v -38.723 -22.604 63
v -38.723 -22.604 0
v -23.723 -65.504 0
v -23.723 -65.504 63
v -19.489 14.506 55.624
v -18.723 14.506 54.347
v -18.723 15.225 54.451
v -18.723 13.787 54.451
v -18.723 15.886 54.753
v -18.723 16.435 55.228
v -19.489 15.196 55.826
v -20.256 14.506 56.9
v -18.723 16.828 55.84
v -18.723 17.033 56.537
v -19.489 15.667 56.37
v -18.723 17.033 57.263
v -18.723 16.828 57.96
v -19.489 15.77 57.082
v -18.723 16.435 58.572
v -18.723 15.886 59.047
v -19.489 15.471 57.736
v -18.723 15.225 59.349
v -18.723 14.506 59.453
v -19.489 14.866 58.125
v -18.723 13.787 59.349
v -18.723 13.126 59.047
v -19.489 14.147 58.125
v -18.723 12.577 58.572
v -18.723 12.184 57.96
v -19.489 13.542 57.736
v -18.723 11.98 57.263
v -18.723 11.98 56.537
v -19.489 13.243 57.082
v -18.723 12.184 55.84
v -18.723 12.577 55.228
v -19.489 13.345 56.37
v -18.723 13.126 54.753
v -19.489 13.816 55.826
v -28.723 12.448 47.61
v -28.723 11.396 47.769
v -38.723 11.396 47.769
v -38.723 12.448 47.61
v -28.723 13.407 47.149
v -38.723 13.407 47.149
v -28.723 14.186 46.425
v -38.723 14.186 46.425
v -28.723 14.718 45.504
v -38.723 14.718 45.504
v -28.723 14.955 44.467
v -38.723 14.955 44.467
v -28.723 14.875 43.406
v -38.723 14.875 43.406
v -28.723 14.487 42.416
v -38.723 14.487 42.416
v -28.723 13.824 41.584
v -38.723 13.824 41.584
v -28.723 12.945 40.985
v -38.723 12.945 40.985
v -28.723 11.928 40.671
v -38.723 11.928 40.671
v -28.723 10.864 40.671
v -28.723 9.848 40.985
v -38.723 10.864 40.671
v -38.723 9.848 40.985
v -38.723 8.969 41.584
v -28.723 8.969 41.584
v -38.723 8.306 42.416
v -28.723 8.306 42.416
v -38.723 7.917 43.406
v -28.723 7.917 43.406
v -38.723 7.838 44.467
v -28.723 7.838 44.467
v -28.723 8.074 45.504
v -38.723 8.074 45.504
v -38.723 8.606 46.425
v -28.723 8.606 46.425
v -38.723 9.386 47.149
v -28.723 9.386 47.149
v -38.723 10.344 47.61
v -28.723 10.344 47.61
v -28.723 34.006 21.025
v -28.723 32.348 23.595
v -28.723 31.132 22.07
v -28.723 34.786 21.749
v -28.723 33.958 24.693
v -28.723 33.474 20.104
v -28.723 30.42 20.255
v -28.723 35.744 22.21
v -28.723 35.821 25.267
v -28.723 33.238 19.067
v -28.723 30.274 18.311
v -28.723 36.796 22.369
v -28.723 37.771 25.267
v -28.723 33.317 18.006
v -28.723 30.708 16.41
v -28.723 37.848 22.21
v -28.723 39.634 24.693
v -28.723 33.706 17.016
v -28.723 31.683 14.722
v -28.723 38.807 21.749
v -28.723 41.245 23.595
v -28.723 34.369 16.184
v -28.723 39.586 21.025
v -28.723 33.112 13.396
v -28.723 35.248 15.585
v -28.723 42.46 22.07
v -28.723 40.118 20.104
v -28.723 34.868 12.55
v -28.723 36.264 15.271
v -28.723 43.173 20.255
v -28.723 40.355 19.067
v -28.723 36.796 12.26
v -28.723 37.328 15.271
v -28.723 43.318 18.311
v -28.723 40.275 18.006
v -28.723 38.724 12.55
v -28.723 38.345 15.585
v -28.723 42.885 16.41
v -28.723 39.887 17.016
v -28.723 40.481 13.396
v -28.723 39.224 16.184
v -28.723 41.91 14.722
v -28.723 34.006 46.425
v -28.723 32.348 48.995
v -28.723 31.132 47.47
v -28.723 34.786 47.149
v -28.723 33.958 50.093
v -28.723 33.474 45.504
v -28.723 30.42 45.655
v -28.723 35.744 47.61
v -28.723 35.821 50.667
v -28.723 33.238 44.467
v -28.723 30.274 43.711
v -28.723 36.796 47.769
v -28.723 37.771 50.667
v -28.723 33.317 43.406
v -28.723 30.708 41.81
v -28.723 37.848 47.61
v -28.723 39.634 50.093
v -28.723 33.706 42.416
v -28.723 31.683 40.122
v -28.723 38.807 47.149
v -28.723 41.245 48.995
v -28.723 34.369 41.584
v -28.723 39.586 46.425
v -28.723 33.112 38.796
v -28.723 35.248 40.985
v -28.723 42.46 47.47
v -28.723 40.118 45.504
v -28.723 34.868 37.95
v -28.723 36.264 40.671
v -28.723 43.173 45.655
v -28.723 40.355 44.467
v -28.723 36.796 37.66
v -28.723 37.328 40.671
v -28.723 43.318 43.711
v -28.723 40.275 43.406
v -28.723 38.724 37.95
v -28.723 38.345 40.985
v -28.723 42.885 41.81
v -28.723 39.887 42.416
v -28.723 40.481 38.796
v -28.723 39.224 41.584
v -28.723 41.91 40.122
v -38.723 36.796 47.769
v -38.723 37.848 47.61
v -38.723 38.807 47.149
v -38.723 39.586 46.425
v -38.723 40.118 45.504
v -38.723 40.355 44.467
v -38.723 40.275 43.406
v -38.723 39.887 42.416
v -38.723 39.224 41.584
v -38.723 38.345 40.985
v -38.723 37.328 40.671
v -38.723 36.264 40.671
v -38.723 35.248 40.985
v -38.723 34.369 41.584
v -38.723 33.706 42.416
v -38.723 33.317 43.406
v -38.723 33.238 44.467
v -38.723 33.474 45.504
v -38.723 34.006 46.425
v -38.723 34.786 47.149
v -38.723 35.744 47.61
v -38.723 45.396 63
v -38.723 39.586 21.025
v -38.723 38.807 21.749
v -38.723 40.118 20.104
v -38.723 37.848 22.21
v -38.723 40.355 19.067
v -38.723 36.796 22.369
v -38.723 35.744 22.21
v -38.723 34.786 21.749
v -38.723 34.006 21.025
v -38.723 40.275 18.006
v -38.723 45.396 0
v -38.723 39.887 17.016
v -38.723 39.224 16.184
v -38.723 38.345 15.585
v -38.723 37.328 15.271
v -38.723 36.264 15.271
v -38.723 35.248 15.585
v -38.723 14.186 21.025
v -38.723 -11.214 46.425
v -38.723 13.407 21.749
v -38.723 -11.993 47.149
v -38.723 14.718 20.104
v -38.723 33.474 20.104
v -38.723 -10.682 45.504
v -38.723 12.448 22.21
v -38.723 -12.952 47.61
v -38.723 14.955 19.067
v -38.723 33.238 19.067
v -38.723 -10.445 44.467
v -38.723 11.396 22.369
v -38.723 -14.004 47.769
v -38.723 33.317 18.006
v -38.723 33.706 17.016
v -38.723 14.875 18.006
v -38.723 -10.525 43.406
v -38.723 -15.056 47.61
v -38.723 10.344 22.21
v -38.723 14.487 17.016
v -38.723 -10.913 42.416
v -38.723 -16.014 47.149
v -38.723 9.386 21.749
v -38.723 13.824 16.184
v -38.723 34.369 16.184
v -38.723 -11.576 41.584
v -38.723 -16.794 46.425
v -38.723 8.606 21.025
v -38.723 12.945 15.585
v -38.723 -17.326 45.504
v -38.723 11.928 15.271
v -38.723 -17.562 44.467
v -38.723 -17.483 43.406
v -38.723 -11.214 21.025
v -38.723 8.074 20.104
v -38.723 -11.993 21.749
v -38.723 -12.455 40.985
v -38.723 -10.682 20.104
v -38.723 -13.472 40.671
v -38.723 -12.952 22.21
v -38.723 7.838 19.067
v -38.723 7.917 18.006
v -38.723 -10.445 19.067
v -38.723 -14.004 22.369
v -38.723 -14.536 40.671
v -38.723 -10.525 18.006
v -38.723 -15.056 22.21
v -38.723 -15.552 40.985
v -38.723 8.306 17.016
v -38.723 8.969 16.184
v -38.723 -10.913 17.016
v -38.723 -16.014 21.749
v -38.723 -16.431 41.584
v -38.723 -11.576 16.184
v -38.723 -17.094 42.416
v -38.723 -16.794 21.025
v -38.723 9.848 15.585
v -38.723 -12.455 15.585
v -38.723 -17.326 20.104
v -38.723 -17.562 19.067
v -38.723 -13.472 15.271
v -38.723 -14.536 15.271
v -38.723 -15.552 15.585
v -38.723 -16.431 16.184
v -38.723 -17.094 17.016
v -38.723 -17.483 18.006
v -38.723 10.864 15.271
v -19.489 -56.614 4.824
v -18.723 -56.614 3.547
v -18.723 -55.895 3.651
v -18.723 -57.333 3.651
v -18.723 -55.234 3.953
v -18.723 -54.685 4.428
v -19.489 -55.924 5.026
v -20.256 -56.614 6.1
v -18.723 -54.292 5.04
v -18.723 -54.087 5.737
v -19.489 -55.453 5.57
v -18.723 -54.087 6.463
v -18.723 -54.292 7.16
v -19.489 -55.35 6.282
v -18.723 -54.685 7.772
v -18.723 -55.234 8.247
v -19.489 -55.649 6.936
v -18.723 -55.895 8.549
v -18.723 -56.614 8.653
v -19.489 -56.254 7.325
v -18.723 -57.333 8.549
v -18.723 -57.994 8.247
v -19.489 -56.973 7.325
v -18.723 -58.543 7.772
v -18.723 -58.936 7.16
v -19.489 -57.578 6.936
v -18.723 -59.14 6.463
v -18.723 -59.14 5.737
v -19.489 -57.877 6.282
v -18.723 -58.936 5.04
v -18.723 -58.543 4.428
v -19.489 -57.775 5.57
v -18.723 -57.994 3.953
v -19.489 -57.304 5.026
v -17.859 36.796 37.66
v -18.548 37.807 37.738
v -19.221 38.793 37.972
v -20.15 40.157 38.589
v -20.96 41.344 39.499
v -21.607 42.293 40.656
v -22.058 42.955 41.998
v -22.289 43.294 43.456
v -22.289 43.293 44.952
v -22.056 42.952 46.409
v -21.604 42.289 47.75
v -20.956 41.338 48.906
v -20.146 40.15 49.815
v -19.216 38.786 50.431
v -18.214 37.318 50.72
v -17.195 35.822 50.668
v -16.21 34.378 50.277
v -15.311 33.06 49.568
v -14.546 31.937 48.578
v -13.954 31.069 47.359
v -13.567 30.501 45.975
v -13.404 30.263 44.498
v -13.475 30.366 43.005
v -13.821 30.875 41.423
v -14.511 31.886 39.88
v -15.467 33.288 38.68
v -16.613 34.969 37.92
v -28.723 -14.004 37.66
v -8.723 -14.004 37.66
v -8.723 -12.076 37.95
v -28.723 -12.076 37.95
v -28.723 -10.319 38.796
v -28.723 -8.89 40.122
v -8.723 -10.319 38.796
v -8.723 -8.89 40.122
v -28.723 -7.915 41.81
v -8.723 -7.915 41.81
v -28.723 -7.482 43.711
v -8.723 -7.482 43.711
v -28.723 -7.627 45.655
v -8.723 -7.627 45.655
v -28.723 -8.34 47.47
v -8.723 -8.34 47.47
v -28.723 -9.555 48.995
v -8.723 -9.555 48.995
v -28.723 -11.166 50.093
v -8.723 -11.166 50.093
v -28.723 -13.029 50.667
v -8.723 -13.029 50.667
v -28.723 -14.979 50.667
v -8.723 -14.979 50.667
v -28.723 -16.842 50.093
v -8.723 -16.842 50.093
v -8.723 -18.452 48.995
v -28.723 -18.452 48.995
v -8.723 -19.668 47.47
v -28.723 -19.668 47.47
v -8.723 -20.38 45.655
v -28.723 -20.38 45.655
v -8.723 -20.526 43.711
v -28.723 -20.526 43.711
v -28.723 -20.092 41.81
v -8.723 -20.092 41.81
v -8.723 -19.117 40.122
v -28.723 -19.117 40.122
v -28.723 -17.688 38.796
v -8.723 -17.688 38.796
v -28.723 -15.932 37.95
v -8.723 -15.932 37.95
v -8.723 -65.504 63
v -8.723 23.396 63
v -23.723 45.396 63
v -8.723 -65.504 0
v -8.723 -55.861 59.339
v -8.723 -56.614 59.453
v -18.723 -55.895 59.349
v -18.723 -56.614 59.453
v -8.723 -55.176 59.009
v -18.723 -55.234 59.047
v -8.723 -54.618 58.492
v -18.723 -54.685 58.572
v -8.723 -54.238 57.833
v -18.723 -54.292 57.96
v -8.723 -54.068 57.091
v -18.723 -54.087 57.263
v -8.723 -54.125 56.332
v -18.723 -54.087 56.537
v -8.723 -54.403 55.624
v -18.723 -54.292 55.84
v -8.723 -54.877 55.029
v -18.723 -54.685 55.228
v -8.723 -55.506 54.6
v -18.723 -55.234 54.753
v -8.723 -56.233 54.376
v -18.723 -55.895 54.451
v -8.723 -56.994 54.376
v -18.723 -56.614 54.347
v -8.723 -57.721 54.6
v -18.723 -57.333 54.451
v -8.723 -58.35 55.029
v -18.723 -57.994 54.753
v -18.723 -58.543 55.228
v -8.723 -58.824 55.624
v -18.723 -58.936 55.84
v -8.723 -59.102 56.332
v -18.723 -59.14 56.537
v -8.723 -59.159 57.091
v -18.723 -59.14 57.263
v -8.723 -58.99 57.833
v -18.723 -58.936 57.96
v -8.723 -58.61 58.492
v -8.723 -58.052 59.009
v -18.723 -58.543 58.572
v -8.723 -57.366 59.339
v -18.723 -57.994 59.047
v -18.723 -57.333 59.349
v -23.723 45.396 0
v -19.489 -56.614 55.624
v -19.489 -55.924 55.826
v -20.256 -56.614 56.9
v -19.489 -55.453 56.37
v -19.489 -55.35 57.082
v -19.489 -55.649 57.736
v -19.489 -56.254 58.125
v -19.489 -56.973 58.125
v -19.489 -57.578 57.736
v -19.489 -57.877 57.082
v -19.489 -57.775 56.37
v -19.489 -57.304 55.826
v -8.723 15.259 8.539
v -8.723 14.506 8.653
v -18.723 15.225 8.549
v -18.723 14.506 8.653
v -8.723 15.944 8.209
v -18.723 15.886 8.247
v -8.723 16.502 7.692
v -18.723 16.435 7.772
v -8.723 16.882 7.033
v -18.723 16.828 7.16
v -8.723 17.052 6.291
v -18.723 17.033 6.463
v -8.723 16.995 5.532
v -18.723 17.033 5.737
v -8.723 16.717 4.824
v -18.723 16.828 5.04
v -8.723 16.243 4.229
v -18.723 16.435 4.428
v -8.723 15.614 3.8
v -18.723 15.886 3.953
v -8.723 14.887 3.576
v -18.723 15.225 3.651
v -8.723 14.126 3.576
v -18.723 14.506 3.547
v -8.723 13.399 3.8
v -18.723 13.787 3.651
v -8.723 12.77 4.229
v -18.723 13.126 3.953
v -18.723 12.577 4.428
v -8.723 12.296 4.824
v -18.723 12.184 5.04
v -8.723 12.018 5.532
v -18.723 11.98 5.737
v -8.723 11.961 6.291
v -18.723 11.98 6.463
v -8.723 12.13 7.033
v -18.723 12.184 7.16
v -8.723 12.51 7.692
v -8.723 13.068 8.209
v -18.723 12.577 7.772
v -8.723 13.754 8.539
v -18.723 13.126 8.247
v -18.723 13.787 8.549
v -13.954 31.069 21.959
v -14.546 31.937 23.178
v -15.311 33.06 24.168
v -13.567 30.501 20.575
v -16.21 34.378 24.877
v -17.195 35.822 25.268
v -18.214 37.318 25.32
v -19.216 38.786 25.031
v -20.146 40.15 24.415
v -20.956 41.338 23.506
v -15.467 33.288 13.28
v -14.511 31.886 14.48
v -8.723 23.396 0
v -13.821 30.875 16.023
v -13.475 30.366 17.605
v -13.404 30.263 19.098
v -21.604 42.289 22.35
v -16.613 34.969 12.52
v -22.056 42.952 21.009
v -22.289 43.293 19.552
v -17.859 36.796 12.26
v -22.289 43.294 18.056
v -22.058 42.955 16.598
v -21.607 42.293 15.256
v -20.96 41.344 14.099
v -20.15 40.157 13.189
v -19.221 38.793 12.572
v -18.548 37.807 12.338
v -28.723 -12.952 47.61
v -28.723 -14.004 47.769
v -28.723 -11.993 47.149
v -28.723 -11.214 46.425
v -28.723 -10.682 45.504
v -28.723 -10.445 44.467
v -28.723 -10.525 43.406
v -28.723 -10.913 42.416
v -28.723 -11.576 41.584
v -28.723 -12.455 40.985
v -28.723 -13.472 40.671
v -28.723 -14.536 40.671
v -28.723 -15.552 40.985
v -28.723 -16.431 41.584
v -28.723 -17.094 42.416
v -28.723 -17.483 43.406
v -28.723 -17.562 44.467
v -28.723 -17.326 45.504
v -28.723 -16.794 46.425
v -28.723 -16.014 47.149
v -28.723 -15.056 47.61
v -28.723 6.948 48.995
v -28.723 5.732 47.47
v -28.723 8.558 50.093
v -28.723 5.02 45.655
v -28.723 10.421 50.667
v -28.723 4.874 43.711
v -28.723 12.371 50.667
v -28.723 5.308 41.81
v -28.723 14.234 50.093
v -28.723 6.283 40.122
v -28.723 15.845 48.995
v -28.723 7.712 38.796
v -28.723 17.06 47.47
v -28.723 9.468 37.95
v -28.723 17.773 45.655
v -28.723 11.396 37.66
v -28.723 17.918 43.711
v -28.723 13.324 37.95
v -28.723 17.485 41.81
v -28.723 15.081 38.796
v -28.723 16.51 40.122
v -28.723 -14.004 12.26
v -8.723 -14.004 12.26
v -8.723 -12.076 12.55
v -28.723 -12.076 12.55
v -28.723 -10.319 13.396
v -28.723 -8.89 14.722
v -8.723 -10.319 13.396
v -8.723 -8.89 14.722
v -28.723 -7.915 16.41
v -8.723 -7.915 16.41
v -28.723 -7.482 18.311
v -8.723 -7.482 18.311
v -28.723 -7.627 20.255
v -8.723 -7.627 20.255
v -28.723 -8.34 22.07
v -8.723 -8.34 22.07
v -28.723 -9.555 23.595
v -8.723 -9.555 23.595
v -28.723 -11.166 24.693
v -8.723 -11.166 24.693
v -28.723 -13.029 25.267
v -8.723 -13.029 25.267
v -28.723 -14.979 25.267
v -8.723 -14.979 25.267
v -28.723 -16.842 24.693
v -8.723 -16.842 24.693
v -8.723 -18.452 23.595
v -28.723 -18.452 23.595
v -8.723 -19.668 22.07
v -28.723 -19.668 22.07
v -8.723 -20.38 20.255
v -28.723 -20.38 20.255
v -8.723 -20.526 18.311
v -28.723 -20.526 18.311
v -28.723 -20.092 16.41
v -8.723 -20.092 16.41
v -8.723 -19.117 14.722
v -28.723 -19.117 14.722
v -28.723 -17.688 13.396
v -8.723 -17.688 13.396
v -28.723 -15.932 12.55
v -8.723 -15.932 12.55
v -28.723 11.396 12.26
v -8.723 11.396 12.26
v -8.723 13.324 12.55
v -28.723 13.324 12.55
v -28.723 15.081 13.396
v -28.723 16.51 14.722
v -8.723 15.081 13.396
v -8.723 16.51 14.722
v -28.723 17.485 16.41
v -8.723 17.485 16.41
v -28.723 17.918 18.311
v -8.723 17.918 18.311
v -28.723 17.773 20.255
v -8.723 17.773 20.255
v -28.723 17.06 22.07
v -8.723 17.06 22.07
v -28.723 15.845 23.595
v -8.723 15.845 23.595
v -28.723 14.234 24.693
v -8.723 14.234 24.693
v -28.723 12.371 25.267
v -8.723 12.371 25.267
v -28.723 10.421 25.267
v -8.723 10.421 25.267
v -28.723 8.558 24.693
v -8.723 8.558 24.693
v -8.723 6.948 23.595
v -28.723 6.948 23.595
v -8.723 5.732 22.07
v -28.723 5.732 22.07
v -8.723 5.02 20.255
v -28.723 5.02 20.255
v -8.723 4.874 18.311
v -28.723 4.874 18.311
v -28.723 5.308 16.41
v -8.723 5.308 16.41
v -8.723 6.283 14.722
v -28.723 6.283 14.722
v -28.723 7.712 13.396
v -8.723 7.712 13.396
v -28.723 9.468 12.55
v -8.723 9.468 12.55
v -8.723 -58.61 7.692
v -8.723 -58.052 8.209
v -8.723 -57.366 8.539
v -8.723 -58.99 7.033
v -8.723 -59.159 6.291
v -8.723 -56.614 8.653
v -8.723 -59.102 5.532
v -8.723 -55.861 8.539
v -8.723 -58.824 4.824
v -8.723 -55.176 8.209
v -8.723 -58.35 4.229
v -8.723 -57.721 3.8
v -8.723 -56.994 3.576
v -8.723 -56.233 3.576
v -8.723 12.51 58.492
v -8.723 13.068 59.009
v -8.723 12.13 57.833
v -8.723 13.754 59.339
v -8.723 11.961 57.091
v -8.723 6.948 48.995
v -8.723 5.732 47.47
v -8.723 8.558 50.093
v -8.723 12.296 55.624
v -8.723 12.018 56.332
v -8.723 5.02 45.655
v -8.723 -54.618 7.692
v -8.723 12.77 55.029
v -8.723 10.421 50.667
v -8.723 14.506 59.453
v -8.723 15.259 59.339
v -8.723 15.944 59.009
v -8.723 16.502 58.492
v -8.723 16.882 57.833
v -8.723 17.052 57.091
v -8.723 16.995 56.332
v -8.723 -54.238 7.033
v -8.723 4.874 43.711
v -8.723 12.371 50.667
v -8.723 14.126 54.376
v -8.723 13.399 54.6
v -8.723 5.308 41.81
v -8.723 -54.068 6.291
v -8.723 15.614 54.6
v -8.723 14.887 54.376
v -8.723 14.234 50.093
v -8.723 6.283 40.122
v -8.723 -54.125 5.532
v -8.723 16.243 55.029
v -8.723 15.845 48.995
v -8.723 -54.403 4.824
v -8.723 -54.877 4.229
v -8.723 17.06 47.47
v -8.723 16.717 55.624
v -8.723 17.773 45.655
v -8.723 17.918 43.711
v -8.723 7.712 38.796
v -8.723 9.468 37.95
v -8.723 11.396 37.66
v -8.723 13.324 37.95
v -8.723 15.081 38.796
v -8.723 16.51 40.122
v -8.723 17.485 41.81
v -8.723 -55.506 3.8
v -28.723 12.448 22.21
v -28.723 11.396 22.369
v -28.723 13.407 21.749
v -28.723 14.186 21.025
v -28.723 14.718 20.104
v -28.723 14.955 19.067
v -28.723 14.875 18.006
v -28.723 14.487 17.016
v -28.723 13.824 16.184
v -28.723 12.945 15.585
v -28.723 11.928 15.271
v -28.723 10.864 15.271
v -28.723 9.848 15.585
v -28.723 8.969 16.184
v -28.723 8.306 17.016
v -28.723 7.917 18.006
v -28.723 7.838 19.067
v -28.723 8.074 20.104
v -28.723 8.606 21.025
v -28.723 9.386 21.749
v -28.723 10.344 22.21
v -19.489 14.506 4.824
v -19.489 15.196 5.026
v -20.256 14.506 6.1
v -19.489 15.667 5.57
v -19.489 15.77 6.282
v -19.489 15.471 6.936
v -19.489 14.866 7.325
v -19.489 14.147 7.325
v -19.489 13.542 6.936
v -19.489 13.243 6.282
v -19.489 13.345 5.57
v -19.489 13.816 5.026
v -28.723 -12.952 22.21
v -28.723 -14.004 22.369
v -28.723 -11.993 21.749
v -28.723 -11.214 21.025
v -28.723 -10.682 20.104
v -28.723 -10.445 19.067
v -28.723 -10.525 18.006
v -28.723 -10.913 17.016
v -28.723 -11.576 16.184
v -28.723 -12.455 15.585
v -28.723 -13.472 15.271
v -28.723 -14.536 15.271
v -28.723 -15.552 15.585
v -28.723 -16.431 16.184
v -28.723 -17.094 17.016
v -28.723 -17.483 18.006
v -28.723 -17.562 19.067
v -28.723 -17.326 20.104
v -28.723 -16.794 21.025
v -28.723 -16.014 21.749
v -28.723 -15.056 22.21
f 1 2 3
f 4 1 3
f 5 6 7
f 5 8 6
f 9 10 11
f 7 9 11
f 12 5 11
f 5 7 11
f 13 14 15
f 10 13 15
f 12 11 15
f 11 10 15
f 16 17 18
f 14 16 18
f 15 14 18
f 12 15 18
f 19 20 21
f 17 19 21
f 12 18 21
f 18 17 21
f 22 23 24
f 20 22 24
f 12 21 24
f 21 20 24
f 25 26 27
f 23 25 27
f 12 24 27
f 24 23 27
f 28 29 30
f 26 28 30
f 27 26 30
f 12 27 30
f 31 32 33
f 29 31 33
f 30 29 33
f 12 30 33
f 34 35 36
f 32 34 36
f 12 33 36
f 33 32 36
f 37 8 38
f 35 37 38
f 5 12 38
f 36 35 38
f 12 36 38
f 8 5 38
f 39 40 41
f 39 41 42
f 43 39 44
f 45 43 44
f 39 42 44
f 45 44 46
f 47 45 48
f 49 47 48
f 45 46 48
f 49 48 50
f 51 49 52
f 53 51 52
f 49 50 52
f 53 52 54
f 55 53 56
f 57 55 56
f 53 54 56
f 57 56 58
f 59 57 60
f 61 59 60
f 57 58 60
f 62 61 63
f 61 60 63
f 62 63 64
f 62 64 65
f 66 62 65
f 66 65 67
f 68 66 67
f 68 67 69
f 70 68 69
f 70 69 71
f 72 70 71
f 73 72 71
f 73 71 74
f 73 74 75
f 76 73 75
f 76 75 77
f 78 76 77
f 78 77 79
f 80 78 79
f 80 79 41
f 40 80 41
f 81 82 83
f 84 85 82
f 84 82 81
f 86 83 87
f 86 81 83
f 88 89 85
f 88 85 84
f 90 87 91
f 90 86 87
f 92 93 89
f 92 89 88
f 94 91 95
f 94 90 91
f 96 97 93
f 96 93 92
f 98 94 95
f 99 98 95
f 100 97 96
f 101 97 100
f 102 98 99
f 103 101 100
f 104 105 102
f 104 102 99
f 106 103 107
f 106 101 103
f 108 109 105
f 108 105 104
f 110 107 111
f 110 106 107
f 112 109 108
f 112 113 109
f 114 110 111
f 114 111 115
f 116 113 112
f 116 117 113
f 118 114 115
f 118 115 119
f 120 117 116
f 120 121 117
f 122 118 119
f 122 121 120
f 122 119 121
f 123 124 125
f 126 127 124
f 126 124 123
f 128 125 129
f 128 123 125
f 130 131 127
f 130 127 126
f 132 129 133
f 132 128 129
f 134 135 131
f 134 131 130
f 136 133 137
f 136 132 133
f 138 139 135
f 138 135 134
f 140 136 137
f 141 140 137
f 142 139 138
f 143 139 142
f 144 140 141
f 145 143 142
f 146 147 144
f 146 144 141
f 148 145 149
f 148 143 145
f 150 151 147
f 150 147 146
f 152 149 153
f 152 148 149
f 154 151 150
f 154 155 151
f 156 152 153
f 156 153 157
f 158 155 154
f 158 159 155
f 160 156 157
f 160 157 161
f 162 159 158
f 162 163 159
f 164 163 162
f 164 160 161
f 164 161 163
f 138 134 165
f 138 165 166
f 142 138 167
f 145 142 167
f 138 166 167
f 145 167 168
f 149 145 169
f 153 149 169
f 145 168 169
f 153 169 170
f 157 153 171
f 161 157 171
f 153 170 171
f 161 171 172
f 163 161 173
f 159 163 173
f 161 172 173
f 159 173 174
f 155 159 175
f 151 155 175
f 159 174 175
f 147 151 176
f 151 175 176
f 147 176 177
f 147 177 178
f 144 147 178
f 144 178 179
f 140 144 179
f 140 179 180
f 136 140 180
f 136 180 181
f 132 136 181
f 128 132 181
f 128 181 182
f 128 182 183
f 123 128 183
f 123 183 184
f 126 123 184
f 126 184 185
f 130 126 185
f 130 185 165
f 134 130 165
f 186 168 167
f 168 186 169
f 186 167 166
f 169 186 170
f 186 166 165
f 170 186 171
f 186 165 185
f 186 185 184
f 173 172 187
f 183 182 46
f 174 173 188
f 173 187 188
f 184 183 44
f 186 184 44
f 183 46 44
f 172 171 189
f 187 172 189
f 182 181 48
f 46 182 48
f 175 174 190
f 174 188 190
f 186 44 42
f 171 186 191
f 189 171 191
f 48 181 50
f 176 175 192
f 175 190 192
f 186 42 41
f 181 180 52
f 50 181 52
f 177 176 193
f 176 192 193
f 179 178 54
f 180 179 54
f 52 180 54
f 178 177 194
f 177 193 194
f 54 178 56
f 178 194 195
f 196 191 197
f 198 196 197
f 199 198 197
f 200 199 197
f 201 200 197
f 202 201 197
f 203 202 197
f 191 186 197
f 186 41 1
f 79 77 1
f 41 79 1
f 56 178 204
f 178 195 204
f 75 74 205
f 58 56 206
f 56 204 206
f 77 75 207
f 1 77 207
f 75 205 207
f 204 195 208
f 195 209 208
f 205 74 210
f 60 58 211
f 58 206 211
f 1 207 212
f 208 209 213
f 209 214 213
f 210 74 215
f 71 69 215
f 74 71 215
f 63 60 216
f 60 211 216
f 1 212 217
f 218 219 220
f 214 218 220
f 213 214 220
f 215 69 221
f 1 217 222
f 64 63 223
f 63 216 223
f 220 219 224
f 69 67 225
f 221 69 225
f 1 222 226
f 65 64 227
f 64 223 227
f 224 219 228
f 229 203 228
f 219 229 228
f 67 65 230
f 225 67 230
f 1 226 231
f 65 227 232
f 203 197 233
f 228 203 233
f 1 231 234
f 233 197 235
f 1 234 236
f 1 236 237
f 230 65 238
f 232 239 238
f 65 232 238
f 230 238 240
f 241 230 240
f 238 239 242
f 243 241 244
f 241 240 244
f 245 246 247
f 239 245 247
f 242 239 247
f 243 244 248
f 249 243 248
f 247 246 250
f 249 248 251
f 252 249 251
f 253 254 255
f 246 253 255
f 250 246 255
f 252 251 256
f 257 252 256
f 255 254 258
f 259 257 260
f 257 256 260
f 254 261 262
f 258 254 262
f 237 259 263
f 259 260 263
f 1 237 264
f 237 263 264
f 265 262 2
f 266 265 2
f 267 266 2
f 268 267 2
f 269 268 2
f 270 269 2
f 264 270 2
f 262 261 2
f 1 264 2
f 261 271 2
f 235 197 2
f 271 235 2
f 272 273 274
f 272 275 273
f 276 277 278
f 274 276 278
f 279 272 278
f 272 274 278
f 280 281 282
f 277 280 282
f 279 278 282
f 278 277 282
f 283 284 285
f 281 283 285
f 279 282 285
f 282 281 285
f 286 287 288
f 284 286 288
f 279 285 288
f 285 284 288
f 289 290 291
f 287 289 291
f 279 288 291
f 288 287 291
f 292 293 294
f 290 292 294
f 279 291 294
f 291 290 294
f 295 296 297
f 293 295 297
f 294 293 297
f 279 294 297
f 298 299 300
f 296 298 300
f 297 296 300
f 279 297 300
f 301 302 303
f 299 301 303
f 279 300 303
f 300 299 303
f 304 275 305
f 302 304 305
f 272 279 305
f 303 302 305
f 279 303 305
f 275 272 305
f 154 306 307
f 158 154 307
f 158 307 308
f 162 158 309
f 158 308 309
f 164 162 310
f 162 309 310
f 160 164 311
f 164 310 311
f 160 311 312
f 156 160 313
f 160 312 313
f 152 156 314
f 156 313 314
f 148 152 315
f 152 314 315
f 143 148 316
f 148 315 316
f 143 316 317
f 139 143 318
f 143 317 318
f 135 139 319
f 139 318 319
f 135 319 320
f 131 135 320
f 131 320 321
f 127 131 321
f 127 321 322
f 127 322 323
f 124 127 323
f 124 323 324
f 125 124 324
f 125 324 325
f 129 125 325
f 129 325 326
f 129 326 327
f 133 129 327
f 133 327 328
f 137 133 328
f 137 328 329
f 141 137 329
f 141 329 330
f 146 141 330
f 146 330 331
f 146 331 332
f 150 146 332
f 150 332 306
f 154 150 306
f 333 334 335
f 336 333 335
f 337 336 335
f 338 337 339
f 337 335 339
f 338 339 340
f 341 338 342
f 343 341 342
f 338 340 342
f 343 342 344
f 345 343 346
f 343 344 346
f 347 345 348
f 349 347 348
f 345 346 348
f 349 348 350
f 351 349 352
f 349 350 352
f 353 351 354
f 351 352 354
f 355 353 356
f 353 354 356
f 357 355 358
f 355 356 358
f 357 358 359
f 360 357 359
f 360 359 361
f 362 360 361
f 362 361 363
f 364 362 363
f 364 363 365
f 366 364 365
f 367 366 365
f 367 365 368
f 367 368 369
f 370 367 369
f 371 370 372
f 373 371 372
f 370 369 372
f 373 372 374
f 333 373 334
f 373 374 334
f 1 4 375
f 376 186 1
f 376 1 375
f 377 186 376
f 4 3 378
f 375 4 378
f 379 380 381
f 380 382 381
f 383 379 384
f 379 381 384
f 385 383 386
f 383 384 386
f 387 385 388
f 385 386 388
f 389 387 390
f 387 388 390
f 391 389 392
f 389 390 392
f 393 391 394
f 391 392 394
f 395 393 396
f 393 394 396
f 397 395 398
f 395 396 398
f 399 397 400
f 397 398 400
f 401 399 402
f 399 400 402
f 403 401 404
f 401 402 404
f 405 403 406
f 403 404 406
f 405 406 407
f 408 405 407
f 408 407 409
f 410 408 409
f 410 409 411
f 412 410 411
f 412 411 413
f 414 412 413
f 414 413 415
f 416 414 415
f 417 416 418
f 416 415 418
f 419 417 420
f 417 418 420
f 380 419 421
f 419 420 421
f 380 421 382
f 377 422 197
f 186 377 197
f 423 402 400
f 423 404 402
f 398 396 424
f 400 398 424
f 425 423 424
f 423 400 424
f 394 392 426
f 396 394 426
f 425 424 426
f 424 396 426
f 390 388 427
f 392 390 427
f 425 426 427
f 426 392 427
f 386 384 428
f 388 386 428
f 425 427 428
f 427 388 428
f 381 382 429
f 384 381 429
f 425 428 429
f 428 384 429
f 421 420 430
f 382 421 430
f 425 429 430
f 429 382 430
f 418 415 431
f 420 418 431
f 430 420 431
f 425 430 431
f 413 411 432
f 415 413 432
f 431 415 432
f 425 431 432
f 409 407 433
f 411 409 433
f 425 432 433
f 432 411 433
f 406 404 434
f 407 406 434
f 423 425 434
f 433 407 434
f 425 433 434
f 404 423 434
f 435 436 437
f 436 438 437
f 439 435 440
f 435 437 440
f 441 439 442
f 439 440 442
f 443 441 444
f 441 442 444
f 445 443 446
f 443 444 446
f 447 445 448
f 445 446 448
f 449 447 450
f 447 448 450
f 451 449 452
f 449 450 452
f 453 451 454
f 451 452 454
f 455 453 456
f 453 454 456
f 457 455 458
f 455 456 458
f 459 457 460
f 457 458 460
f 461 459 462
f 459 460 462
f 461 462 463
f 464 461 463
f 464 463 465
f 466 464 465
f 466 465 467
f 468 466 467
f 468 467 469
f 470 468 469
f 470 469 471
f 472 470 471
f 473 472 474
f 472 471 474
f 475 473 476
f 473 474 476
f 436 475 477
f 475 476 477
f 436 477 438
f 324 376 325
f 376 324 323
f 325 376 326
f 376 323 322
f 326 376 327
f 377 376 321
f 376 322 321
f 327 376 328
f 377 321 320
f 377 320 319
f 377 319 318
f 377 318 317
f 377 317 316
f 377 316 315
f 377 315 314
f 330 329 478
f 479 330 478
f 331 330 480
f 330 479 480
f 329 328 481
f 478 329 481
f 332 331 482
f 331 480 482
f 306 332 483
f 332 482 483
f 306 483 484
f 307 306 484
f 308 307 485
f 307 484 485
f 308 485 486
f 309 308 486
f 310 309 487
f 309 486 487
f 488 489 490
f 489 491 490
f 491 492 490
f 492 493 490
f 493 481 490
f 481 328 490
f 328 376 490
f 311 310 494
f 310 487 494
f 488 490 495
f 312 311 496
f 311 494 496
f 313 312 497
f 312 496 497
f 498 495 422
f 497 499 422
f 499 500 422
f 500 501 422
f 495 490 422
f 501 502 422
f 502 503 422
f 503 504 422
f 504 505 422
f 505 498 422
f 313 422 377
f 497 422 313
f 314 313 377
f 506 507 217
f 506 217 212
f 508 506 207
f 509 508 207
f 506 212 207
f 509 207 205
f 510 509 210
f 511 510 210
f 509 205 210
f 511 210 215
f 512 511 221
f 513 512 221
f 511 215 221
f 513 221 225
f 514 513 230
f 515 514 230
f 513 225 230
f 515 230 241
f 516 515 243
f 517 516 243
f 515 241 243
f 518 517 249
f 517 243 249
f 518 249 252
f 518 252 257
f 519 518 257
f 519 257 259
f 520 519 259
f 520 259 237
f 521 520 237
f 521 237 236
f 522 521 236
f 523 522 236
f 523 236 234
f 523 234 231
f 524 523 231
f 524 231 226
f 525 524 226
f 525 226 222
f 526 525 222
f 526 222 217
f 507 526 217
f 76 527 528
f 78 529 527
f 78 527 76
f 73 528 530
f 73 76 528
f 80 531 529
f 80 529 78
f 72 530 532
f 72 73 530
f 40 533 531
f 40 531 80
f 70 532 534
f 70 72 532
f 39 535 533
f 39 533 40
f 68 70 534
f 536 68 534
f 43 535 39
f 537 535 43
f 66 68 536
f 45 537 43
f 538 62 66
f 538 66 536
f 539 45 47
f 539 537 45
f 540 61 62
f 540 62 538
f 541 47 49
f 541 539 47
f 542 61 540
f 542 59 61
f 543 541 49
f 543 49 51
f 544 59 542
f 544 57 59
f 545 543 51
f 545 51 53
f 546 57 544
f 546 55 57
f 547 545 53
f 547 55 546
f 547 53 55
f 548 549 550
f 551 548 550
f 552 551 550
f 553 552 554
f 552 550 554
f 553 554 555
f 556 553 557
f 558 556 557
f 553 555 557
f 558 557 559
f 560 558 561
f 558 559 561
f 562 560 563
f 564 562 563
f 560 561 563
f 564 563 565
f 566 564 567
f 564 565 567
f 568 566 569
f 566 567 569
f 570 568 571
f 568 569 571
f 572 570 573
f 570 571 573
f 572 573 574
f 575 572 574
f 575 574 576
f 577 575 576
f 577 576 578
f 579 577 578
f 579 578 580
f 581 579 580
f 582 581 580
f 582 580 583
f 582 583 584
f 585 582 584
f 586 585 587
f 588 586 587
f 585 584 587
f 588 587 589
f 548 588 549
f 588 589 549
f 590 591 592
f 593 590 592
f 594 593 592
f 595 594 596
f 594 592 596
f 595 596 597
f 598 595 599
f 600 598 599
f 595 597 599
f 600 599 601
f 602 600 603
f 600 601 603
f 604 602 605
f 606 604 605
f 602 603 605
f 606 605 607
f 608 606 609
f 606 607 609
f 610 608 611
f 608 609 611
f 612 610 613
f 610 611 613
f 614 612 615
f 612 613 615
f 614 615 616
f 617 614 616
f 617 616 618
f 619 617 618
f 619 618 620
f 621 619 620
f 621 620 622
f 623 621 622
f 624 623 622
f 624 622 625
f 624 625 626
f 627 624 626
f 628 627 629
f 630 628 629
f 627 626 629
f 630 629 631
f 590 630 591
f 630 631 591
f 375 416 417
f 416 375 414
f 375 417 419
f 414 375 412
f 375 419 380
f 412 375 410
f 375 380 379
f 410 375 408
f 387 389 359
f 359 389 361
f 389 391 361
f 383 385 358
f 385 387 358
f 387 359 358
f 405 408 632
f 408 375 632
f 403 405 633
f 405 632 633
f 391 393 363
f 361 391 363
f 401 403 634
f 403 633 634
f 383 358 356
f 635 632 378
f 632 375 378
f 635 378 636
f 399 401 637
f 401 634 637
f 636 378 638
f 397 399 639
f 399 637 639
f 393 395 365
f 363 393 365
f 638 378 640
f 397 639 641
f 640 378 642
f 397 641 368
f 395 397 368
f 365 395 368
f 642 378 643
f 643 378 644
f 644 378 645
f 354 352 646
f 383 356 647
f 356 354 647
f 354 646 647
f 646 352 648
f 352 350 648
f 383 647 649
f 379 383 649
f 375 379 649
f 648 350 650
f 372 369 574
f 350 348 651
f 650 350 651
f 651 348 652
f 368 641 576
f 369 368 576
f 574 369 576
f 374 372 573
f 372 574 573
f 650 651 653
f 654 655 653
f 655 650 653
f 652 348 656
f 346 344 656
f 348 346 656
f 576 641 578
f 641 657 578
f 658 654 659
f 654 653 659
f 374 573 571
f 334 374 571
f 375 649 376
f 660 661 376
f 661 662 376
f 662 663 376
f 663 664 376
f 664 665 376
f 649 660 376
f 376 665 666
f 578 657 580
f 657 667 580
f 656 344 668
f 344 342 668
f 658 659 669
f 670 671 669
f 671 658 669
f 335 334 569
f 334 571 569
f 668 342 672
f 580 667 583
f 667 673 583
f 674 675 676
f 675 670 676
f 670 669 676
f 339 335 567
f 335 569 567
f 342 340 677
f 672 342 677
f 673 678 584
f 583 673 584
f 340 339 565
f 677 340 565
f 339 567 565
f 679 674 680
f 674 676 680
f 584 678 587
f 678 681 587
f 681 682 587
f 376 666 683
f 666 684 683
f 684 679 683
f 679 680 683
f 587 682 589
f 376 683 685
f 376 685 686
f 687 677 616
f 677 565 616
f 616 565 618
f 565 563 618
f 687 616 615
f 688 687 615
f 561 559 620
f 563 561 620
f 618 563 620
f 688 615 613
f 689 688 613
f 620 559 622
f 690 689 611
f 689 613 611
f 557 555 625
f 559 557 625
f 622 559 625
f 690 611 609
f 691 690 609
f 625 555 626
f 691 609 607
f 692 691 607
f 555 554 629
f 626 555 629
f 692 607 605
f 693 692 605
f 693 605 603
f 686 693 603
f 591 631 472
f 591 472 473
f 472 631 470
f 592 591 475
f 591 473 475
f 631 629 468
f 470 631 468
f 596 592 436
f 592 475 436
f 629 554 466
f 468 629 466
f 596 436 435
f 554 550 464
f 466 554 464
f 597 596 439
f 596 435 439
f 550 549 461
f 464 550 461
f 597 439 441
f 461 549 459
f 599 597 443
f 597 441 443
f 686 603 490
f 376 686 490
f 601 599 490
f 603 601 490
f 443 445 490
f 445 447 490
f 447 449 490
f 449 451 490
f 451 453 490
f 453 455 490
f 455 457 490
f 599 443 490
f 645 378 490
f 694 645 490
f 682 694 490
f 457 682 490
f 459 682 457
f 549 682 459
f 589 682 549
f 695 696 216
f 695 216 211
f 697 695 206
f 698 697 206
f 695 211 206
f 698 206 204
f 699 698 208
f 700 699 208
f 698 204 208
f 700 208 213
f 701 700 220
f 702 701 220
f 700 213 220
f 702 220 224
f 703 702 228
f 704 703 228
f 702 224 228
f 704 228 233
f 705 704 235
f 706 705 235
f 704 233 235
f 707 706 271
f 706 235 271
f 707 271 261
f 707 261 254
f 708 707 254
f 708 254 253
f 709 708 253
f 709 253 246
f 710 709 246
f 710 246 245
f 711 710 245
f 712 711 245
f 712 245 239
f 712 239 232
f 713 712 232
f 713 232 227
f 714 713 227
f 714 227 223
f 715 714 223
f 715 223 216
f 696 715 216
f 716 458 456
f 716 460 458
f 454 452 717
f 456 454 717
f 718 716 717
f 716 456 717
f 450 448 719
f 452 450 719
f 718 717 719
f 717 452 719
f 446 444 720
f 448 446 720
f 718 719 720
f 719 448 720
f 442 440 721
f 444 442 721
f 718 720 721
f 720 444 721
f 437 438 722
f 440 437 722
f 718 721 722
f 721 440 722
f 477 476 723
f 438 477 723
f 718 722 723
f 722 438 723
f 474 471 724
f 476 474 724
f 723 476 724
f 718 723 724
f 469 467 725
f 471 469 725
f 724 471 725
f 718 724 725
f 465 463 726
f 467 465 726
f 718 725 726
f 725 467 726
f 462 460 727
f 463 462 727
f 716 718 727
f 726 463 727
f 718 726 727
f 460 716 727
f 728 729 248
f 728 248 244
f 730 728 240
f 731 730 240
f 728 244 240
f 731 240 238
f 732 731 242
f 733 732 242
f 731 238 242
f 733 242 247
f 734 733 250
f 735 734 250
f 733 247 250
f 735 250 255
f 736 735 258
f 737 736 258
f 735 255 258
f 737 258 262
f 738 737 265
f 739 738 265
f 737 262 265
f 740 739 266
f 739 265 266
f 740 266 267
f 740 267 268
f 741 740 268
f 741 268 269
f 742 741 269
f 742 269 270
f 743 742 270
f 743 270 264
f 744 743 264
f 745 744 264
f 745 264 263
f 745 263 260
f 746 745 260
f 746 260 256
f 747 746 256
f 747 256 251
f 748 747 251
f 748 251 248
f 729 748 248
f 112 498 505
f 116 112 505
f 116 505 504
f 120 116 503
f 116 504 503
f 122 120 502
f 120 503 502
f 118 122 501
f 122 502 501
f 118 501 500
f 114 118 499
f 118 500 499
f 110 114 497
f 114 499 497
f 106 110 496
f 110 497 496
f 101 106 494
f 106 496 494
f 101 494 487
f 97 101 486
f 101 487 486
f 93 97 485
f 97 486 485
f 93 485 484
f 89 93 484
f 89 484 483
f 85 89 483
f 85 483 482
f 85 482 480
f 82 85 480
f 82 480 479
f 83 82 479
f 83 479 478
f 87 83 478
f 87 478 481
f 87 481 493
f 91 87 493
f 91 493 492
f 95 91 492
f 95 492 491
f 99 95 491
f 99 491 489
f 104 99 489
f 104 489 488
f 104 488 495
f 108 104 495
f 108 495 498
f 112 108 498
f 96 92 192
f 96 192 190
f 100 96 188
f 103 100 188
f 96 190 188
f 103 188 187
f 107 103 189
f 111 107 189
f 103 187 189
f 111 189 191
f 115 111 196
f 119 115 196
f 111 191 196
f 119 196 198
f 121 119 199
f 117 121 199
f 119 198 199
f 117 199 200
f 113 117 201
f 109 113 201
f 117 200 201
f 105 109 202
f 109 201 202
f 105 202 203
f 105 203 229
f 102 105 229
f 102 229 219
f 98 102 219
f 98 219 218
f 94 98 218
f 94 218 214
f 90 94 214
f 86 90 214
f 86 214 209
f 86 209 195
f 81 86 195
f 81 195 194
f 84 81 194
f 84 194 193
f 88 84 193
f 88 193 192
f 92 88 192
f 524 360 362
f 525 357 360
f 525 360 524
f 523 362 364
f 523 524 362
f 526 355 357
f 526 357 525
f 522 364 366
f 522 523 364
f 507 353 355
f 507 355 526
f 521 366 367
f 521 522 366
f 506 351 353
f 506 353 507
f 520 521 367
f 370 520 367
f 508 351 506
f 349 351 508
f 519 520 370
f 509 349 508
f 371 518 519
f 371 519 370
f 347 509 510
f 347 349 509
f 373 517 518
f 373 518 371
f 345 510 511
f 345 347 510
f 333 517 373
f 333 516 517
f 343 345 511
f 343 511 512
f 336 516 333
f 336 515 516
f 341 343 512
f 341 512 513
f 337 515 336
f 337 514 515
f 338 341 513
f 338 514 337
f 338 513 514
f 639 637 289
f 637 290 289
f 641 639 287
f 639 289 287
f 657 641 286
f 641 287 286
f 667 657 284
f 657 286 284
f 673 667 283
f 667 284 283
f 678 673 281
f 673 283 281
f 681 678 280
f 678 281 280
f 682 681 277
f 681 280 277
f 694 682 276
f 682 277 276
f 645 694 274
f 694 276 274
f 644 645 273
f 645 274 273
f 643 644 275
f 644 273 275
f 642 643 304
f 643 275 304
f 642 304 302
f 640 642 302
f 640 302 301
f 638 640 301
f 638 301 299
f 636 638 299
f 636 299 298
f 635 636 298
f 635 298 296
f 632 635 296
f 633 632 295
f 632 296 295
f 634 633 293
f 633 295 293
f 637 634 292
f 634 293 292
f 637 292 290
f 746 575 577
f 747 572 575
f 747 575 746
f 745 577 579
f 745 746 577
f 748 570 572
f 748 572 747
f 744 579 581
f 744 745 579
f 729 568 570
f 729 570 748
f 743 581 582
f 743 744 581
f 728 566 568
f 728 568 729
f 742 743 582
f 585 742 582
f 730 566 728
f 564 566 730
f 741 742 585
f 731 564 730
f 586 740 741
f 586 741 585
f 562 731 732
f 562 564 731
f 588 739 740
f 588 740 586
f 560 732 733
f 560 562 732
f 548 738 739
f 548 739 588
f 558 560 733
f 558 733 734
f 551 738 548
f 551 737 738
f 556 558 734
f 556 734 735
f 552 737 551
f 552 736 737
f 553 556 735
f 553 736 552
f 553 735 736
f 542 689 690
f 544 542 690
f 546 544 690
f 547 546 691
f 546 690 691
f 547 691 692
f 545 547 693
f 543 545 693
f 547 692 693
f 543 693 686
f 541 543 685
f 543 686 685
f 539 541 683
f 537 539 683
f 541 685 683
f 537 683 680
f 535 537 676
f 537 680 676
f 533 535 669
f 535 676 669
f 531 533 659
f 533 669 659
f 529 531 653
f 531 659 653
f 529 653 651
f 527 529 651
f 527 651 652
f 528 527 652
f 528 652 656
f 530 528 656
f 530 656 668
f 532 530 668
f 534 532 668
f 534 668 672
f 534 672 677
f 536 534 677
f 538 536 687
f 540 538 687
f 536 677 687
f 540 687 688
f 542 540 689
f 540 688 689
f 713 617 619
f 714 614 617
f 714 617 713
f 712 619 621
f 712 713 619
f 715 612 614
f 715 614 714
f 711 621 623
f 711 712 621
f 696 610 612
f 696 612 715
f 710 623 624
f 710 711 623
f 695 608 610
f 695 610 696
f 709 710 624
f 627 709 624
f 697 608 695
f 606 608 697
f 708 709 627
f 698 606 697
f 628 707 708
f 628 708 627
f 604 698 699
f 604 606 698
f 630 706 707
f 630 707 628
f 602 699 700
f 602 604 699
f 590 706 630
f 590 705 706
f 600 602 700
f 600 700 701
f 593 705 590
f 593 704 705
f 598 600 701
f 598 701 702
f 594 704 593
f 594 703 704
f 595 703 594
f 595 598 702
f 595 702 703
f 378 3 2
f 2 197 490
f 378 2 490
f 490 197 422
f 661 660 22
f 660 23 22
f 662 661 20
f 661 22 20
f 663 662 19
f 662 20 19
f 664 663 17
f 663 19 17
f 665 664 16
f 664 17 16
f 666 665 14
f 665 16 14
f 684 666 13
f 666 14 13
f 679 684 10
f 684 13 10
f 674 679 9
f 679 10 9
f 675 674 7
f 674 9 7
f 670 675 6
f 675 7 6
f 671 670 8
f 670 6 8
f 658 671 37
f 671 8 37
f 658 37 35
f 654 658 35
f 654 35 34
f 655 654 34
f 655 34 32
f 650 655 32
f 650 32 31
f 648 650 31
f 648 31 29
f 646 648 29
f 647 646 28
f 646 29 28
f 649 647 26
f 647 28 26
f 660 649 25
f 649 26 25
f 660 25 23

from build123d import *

# Parameters (mm, degrees)
BOSS_EXTRUDE1_DEPTH         = 63
SKETCH3_R                   = 3.5687
CUT_EXTRUDE1_DEPTH          = 63
SKETCH4_R                   = 6.5405
CUT_EXTRUDE2_DEPTH          = 20
F_1_4_20_TAPPED_HOLE1_D     = 5.1054
F_1_4_20_TAPPED_HOLE1_DEPTH = 10
F_1_4_20_TAPPED_HOLE1_TIP   = 1.533816902


with BuildPart() as part:
    # Sketch1 → Boss-Extrude1 (new body)
    with BuildSketch(Plane.XY):
        Polygon((-38.72257574, 45.396234333), (-38.72257574, -22.603765667), (-23.72257574, -65.503765667), (-8.72257574, -65.503765667), (-8.72257574, 23.396234333), (-23.72257574, 45.396234333), align=None)
    extrude(amount=BOSS_EXTRUDE1_DEPTH)

    # Sketch3 → Cut-Extrude1 (cut)
    with BuildSketch(Plane.ZY.offset(38.72257574)):
        with Locations((18.8, 36.796234333)):
            Circle(SKETCH3_R)
        with Locations((44.2, 36.796234333)):
            Circle(SKETCH3_R)
        with Locations((18.8, 11.396234333)):
            Circle(SKETCH3_R)
        with Locations((44.2, 11.396234333)):
            Circle(SKETCH3_R)
        with Locations((18.8, -14.003765667)):
            Circle(SKETCH3_R)
        with Locations((44.2, -14.003765667)):
            Circle(SKETCH3_R)
    extrude(amount=-CUT_EXTRUDE1_DEPTH, mode=Mode.SUBTRACT)

    # Sketch4 → Cut-Extrude2 (cut)
    with BuildSketch(Plane(origin=(-8.72257574, 0, 0), x_dir=(0, 0, -1), z_dir=(1, 0, 0))):
        with Locations((-44.2, -14.003765667)):
            Circle(SKETCH4_R)
        with Locations((-18.8, -14.003765667)):
            Circle(SKETCH4_R)
        with Locations((-18.8, 11.396234333)):
            Circle(SKETCH4_R)
        with Locations((-44.2, 36.796234333)):
            Circle(SKETCH4_R)
        with Locations((-18.8, 36.796234333)):
            Circle(SKETCH4_R)
        with Locations((-44.2, 11.396234333)):
            Circle(SKETCH4_R)
    extrude(amount=-CUT_EXTRUDE2_DEPTH, mode=Mode.SUBTRACT)

    # 1/4-20 Tapped Hole1
    with Locations(Plane(origin=(-8.72257574, 0, 0), x_dir=(0, 0, -1), z_dir=(1, 0, 0))):
        with Locations((-56.9, 14.506234333), (-6.1, 14.506234333), (-56.9, -56.613765667), (-6.1, -56.613765667)):
            Hole(F_1_4_20_TAPPED_HOLE1_D / 2, depth=F_1_4_20_TAPPED_HOLE1_DEPTH)
            with Locations((0, 0, -(F_1_4_20_TAPPED_HOLE1_DEPTH + F_1_4_20_TAPPED_HOLE1_TIP / 2))):  # 118° drill point
                Cone(0, F_1_4_20_TAPPED_HOLE1_D / 2, F_1_4_20_TAPPED_HOLE1_TIP, mode=Mode.SUBTRACT)


solid = part.part
